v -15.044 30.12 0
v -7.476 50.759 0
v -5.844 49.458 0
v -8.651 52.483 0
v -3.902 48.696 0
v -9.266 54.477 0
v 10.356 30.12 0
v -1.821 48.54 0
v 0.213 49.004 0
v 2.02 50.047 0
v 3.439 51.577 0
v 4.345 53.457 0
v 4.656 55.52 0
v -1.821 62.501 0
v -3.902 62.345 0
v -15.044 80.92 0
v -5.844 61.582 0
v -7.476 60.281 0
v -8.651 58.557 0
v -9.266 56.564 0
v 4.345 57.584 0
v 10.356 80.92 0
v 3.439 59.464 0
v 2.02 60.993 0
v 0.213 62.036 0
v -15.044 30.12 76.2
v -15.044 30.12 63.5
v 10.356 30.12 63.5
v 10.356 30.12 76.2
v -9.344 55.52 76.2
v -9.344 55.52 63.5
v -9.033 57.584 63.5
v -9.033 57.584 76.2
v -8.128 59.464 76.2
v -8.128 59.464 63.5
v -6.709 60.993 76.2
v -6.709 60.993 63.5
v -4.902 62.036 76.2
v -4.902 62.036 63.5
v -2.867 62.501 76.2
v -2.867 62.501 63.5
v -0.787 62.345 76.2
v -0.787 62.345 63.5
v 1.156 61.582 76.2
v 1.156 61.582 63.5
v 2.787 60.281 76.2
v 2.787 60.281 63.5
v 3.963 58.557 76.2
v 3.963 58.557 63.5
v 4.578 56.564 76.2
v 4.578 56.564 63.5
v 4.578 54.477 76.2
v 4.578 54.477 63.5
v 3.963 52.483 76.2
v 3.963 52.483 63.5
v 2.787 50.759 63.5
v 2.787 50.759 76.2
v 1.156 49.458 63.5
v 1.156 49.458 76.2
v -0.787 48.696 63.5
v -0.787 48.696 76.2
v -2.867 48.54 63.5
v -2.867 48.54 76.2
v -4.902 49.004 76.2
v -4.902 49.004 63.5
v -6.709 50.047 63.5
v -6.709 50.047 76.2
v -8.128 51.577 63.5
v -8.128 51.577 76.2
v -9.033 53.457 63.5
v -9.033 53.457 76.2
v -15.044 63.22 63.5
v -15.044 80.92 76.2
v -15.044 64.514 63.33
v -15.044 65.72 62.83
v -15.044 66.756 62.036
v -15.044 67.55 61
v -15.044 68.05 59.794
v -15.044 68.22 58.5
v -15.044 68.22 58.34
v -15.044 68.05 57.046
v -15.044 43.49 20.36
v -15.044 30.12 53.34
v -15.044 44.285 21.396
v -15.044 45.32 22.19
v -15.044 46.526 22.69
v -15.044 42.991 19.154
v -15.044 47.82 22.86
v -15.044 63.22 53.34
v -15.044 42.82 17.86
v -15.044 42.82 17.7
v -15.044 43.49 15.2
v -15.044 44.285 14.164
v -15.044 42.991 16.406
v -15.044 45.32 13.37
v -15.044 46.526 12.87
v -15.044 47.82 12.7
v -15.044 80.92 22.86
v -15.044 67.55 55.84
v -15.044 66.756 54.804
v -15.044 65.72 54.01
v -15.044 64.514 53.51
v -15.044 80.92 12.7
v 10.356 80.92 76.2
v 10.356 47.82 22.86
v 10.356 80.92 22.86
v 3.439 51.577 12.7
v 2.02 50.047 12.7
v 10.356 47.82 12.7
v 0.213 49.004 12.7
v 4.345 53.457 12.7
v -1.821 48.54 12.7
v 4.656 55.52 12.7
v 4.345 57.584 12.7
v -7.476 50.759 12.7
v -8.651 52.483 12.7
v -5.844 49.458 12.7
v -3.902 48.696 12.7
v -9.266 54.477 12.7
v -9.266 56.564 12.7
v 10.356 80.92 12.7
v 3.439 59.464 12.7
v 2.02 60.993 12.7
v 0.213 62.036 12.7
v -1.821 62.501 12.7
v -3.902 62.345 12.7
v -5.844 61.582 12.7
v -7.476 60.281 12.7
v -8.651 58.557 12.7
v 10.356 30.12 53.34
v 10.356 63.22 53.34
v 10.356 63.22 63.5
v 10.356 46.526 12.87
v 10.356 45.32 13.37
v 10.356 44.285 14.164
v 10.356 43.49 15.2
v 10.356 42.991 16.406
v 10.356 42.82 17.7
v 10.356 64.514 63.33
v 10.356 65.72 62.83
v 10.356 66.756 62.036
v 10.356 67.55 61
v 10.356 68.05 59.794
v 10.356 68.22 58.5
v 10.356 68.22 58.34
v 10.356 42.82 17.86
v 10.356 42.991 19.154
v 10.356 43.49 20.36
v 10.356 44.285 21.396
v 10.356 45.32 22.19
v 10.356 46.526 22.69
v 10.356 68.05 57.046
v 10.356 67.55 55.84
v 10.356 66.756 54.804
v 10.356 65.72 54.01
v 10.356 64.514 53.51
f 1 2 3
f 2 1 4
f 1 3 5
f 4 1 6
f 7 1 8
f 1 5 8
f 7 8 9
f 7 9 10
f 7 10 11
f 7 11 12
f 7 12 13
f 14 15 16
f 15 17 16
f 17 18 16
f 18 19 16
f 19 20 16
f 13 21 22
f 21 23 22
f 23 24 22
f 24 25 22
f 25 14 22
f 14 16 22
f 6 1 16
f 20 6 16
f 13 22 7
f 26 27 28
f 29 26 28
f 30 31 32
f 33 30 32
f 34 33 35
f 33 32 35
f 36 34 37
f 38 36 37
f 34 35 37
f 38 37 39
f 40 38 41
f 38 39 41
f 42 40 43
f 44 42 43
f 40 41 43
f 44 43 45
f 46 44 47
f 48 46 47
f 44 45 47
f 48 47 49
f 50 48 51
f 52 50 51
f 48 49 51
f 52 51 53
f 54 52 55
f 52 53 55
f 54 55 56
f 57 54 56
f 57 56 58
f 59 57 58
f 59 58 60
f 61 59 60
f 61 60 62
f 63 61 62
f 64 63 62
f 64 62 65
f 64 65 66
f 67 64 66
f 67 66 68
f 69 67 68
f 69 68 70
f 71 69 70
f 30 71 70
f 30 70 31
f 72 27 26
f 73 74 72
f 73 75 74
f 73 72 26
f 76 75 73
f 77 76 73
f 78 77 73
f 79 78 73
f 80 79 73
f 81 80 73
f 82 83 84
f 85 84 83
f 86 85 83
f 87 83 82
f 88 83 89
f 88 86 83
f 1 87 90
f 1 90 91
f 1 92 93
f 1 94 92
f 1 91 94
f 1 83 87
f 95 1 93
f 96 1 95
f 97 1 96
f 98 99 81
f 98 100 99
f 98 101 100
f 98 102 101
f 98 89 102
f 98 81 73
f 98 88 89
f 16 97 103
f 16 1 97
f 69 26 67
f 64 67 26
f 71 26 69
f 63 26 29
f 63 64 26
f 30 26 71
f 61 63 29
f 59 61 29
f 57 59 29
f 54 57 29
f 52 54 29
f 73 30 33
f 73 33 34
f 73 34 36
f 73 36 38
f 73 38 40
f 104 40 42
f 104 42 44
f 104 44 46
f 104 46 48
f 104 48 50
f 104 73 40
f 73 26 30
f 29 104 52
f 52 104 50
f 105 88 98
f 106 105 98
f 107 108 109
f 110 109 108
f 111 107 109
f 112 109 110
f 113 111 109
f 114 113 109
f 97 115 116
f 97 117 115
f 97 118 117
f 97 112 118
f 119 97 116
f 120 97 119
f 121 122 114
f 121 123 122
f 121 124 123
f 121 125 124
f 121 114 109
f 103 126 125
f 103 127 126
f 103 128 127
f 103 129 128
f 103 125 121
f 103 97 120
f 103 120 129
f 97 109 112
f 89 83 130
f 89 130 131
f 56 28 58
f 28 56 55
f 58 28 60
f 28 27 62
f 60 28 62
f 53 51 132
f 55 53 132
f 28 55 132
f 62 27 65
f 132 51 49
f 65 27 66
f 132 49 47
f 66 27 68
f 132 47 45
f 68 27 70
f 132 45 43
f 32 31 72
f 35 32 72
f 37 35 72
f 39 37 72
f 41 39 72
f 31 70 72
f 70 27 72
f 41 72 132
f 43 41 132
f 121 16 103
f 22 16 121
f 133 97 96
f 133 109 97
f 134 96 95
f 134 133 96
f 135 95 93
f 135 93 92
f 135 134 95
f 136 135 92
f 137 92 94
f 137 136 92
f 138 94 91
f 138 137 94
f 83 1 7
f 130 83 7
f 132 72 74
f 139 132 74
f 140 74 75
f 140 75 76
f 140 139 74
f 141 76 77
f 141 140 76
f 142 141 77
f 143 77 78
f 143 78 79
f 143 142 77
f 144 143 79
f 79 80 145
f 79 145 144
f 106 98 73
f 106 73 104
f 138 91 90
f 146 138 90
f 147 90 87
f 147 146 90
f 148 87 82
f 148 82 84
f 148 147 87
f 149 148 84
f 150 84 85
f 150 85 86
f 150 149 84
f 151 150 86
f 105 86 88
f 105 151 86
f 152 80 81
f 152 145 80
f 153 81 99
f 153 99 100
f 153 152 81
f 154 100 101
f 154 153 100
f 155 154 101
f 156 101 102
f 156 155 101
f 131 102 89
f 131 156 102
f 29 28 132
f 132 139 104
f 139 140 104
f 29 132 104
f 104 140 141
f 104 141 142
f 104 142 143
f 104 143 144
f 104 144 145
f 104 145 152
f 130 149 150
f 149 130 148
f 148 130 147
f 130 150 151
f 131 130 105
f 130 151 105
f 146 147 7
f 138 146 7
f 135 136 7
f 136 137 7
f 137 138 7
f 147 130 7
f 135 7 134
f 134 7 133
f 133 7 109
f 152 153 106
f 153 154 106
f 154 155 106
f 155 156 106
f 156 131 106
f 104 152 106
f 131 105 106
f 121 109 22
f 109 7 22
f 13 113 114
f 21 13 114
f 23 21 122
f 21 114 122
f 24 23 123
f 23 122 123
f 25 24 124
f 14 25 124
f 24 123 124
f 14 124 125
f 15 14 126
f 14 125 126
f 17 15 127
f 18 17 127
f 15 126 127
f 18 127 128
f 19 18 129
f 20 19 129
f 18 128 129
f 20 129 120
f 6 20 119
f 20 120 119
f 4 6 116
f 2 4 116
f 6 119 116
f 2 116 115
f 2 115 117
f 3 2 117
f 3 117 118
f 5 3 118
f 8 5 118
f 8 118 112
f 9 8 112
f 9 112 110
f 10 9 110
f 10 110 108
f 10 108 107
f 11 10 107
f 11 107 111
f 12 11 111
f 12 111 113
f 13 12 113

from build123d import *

# Parameters (mm, degrees)
SKETCH1_W                        = 25.4
SKETCH1_H                        = 50.8
BOSS_EXTRUDE1_DEPTH              = 76.2
SKETCH2_W                        = 10.16
SKETCH2_H                        = 38.1
CUT_EXTRUDE1_DEPTH               = 115.016182683
TAP_DRILL_FOR_M16X2_0_TAP2_D     = 14
TAP_DRILL_FOR_M16X2_0_TAP2_DEPTH = 12.7
TAP_DRILL_FOR_M16X2_0_TAP1_D     = 14
TAP_DRILL_FOR_M16X2_0_TAP1_DEPTH = 12.7
FILLET1_R                        = 5


with BuildPart() as part:
    # Sketch1 → Boss-Extrude1 (new body)
    with BuildSketch(Plane.XY):
        with Locations((-2.344226023, 55.520268868)):
            Rectangle(SKETCH1_W, SKETCH1_H)
    extrude(amount=BOSS_EXTRUDE1_DEPTH)

    # Sketch2 → Cut-Extrude1 (cut, through all)
    with BuildSketch(Plane.ZY.offset(15.044226023)):
        with Locations((17.78, 61.870268868)):
            Rectangle(SKETCH2_W, SKETCH2_H)
        with Locations((58.42, 49.170268868)):
            Rectangle(SKETCH2_W, SKETCH2_H)
    extrude(amount=-CUT_EXTRUDE1_DEPTH, mode=Mode.SUBTRACT)

    # Tap Drill for M16x2.0 Tap2
    with Locations(Plane(origin=(0, 0, 0), x_dir=(-1, 0, 0), z_dir=(0, 0, -1))):
        with Locations((2.344226023, 55.520268868)):
            Hole(TAP_DRILL_FOR_M16X2_0_TAP2_D / 2, depth=TAP_DRILL_FOR_M16X2_0_TAP2_DEPTH)

    # Tap Drill for M16x2.0 Tap1
    with Locations(Plane.XY.offset(76.2)):
        with Locations((-2.344226023, 55.520268868)):
            Hole(TAP_DRILL_FOR_M16X2_0_TAP1_D / 2, depth=TAP_DRILL_FOR_M16X2_0_TAP1_DEPTH)

    # Fillet1
    fillet1_edges = [part.edges().sort_by_distance(p)[0] for p in [
        (-2.344226023, 42.820268868, 12.7),
        (-2.344226023, 42.820268868, 22.86),
        (-2.344226023, 68.220268868, 53.34),
        (-2.344226023, 68.220268868, 63.5),
    ]]
    fillet(fillet1_edges, radius=FILLET1_R)


solid = part.part
